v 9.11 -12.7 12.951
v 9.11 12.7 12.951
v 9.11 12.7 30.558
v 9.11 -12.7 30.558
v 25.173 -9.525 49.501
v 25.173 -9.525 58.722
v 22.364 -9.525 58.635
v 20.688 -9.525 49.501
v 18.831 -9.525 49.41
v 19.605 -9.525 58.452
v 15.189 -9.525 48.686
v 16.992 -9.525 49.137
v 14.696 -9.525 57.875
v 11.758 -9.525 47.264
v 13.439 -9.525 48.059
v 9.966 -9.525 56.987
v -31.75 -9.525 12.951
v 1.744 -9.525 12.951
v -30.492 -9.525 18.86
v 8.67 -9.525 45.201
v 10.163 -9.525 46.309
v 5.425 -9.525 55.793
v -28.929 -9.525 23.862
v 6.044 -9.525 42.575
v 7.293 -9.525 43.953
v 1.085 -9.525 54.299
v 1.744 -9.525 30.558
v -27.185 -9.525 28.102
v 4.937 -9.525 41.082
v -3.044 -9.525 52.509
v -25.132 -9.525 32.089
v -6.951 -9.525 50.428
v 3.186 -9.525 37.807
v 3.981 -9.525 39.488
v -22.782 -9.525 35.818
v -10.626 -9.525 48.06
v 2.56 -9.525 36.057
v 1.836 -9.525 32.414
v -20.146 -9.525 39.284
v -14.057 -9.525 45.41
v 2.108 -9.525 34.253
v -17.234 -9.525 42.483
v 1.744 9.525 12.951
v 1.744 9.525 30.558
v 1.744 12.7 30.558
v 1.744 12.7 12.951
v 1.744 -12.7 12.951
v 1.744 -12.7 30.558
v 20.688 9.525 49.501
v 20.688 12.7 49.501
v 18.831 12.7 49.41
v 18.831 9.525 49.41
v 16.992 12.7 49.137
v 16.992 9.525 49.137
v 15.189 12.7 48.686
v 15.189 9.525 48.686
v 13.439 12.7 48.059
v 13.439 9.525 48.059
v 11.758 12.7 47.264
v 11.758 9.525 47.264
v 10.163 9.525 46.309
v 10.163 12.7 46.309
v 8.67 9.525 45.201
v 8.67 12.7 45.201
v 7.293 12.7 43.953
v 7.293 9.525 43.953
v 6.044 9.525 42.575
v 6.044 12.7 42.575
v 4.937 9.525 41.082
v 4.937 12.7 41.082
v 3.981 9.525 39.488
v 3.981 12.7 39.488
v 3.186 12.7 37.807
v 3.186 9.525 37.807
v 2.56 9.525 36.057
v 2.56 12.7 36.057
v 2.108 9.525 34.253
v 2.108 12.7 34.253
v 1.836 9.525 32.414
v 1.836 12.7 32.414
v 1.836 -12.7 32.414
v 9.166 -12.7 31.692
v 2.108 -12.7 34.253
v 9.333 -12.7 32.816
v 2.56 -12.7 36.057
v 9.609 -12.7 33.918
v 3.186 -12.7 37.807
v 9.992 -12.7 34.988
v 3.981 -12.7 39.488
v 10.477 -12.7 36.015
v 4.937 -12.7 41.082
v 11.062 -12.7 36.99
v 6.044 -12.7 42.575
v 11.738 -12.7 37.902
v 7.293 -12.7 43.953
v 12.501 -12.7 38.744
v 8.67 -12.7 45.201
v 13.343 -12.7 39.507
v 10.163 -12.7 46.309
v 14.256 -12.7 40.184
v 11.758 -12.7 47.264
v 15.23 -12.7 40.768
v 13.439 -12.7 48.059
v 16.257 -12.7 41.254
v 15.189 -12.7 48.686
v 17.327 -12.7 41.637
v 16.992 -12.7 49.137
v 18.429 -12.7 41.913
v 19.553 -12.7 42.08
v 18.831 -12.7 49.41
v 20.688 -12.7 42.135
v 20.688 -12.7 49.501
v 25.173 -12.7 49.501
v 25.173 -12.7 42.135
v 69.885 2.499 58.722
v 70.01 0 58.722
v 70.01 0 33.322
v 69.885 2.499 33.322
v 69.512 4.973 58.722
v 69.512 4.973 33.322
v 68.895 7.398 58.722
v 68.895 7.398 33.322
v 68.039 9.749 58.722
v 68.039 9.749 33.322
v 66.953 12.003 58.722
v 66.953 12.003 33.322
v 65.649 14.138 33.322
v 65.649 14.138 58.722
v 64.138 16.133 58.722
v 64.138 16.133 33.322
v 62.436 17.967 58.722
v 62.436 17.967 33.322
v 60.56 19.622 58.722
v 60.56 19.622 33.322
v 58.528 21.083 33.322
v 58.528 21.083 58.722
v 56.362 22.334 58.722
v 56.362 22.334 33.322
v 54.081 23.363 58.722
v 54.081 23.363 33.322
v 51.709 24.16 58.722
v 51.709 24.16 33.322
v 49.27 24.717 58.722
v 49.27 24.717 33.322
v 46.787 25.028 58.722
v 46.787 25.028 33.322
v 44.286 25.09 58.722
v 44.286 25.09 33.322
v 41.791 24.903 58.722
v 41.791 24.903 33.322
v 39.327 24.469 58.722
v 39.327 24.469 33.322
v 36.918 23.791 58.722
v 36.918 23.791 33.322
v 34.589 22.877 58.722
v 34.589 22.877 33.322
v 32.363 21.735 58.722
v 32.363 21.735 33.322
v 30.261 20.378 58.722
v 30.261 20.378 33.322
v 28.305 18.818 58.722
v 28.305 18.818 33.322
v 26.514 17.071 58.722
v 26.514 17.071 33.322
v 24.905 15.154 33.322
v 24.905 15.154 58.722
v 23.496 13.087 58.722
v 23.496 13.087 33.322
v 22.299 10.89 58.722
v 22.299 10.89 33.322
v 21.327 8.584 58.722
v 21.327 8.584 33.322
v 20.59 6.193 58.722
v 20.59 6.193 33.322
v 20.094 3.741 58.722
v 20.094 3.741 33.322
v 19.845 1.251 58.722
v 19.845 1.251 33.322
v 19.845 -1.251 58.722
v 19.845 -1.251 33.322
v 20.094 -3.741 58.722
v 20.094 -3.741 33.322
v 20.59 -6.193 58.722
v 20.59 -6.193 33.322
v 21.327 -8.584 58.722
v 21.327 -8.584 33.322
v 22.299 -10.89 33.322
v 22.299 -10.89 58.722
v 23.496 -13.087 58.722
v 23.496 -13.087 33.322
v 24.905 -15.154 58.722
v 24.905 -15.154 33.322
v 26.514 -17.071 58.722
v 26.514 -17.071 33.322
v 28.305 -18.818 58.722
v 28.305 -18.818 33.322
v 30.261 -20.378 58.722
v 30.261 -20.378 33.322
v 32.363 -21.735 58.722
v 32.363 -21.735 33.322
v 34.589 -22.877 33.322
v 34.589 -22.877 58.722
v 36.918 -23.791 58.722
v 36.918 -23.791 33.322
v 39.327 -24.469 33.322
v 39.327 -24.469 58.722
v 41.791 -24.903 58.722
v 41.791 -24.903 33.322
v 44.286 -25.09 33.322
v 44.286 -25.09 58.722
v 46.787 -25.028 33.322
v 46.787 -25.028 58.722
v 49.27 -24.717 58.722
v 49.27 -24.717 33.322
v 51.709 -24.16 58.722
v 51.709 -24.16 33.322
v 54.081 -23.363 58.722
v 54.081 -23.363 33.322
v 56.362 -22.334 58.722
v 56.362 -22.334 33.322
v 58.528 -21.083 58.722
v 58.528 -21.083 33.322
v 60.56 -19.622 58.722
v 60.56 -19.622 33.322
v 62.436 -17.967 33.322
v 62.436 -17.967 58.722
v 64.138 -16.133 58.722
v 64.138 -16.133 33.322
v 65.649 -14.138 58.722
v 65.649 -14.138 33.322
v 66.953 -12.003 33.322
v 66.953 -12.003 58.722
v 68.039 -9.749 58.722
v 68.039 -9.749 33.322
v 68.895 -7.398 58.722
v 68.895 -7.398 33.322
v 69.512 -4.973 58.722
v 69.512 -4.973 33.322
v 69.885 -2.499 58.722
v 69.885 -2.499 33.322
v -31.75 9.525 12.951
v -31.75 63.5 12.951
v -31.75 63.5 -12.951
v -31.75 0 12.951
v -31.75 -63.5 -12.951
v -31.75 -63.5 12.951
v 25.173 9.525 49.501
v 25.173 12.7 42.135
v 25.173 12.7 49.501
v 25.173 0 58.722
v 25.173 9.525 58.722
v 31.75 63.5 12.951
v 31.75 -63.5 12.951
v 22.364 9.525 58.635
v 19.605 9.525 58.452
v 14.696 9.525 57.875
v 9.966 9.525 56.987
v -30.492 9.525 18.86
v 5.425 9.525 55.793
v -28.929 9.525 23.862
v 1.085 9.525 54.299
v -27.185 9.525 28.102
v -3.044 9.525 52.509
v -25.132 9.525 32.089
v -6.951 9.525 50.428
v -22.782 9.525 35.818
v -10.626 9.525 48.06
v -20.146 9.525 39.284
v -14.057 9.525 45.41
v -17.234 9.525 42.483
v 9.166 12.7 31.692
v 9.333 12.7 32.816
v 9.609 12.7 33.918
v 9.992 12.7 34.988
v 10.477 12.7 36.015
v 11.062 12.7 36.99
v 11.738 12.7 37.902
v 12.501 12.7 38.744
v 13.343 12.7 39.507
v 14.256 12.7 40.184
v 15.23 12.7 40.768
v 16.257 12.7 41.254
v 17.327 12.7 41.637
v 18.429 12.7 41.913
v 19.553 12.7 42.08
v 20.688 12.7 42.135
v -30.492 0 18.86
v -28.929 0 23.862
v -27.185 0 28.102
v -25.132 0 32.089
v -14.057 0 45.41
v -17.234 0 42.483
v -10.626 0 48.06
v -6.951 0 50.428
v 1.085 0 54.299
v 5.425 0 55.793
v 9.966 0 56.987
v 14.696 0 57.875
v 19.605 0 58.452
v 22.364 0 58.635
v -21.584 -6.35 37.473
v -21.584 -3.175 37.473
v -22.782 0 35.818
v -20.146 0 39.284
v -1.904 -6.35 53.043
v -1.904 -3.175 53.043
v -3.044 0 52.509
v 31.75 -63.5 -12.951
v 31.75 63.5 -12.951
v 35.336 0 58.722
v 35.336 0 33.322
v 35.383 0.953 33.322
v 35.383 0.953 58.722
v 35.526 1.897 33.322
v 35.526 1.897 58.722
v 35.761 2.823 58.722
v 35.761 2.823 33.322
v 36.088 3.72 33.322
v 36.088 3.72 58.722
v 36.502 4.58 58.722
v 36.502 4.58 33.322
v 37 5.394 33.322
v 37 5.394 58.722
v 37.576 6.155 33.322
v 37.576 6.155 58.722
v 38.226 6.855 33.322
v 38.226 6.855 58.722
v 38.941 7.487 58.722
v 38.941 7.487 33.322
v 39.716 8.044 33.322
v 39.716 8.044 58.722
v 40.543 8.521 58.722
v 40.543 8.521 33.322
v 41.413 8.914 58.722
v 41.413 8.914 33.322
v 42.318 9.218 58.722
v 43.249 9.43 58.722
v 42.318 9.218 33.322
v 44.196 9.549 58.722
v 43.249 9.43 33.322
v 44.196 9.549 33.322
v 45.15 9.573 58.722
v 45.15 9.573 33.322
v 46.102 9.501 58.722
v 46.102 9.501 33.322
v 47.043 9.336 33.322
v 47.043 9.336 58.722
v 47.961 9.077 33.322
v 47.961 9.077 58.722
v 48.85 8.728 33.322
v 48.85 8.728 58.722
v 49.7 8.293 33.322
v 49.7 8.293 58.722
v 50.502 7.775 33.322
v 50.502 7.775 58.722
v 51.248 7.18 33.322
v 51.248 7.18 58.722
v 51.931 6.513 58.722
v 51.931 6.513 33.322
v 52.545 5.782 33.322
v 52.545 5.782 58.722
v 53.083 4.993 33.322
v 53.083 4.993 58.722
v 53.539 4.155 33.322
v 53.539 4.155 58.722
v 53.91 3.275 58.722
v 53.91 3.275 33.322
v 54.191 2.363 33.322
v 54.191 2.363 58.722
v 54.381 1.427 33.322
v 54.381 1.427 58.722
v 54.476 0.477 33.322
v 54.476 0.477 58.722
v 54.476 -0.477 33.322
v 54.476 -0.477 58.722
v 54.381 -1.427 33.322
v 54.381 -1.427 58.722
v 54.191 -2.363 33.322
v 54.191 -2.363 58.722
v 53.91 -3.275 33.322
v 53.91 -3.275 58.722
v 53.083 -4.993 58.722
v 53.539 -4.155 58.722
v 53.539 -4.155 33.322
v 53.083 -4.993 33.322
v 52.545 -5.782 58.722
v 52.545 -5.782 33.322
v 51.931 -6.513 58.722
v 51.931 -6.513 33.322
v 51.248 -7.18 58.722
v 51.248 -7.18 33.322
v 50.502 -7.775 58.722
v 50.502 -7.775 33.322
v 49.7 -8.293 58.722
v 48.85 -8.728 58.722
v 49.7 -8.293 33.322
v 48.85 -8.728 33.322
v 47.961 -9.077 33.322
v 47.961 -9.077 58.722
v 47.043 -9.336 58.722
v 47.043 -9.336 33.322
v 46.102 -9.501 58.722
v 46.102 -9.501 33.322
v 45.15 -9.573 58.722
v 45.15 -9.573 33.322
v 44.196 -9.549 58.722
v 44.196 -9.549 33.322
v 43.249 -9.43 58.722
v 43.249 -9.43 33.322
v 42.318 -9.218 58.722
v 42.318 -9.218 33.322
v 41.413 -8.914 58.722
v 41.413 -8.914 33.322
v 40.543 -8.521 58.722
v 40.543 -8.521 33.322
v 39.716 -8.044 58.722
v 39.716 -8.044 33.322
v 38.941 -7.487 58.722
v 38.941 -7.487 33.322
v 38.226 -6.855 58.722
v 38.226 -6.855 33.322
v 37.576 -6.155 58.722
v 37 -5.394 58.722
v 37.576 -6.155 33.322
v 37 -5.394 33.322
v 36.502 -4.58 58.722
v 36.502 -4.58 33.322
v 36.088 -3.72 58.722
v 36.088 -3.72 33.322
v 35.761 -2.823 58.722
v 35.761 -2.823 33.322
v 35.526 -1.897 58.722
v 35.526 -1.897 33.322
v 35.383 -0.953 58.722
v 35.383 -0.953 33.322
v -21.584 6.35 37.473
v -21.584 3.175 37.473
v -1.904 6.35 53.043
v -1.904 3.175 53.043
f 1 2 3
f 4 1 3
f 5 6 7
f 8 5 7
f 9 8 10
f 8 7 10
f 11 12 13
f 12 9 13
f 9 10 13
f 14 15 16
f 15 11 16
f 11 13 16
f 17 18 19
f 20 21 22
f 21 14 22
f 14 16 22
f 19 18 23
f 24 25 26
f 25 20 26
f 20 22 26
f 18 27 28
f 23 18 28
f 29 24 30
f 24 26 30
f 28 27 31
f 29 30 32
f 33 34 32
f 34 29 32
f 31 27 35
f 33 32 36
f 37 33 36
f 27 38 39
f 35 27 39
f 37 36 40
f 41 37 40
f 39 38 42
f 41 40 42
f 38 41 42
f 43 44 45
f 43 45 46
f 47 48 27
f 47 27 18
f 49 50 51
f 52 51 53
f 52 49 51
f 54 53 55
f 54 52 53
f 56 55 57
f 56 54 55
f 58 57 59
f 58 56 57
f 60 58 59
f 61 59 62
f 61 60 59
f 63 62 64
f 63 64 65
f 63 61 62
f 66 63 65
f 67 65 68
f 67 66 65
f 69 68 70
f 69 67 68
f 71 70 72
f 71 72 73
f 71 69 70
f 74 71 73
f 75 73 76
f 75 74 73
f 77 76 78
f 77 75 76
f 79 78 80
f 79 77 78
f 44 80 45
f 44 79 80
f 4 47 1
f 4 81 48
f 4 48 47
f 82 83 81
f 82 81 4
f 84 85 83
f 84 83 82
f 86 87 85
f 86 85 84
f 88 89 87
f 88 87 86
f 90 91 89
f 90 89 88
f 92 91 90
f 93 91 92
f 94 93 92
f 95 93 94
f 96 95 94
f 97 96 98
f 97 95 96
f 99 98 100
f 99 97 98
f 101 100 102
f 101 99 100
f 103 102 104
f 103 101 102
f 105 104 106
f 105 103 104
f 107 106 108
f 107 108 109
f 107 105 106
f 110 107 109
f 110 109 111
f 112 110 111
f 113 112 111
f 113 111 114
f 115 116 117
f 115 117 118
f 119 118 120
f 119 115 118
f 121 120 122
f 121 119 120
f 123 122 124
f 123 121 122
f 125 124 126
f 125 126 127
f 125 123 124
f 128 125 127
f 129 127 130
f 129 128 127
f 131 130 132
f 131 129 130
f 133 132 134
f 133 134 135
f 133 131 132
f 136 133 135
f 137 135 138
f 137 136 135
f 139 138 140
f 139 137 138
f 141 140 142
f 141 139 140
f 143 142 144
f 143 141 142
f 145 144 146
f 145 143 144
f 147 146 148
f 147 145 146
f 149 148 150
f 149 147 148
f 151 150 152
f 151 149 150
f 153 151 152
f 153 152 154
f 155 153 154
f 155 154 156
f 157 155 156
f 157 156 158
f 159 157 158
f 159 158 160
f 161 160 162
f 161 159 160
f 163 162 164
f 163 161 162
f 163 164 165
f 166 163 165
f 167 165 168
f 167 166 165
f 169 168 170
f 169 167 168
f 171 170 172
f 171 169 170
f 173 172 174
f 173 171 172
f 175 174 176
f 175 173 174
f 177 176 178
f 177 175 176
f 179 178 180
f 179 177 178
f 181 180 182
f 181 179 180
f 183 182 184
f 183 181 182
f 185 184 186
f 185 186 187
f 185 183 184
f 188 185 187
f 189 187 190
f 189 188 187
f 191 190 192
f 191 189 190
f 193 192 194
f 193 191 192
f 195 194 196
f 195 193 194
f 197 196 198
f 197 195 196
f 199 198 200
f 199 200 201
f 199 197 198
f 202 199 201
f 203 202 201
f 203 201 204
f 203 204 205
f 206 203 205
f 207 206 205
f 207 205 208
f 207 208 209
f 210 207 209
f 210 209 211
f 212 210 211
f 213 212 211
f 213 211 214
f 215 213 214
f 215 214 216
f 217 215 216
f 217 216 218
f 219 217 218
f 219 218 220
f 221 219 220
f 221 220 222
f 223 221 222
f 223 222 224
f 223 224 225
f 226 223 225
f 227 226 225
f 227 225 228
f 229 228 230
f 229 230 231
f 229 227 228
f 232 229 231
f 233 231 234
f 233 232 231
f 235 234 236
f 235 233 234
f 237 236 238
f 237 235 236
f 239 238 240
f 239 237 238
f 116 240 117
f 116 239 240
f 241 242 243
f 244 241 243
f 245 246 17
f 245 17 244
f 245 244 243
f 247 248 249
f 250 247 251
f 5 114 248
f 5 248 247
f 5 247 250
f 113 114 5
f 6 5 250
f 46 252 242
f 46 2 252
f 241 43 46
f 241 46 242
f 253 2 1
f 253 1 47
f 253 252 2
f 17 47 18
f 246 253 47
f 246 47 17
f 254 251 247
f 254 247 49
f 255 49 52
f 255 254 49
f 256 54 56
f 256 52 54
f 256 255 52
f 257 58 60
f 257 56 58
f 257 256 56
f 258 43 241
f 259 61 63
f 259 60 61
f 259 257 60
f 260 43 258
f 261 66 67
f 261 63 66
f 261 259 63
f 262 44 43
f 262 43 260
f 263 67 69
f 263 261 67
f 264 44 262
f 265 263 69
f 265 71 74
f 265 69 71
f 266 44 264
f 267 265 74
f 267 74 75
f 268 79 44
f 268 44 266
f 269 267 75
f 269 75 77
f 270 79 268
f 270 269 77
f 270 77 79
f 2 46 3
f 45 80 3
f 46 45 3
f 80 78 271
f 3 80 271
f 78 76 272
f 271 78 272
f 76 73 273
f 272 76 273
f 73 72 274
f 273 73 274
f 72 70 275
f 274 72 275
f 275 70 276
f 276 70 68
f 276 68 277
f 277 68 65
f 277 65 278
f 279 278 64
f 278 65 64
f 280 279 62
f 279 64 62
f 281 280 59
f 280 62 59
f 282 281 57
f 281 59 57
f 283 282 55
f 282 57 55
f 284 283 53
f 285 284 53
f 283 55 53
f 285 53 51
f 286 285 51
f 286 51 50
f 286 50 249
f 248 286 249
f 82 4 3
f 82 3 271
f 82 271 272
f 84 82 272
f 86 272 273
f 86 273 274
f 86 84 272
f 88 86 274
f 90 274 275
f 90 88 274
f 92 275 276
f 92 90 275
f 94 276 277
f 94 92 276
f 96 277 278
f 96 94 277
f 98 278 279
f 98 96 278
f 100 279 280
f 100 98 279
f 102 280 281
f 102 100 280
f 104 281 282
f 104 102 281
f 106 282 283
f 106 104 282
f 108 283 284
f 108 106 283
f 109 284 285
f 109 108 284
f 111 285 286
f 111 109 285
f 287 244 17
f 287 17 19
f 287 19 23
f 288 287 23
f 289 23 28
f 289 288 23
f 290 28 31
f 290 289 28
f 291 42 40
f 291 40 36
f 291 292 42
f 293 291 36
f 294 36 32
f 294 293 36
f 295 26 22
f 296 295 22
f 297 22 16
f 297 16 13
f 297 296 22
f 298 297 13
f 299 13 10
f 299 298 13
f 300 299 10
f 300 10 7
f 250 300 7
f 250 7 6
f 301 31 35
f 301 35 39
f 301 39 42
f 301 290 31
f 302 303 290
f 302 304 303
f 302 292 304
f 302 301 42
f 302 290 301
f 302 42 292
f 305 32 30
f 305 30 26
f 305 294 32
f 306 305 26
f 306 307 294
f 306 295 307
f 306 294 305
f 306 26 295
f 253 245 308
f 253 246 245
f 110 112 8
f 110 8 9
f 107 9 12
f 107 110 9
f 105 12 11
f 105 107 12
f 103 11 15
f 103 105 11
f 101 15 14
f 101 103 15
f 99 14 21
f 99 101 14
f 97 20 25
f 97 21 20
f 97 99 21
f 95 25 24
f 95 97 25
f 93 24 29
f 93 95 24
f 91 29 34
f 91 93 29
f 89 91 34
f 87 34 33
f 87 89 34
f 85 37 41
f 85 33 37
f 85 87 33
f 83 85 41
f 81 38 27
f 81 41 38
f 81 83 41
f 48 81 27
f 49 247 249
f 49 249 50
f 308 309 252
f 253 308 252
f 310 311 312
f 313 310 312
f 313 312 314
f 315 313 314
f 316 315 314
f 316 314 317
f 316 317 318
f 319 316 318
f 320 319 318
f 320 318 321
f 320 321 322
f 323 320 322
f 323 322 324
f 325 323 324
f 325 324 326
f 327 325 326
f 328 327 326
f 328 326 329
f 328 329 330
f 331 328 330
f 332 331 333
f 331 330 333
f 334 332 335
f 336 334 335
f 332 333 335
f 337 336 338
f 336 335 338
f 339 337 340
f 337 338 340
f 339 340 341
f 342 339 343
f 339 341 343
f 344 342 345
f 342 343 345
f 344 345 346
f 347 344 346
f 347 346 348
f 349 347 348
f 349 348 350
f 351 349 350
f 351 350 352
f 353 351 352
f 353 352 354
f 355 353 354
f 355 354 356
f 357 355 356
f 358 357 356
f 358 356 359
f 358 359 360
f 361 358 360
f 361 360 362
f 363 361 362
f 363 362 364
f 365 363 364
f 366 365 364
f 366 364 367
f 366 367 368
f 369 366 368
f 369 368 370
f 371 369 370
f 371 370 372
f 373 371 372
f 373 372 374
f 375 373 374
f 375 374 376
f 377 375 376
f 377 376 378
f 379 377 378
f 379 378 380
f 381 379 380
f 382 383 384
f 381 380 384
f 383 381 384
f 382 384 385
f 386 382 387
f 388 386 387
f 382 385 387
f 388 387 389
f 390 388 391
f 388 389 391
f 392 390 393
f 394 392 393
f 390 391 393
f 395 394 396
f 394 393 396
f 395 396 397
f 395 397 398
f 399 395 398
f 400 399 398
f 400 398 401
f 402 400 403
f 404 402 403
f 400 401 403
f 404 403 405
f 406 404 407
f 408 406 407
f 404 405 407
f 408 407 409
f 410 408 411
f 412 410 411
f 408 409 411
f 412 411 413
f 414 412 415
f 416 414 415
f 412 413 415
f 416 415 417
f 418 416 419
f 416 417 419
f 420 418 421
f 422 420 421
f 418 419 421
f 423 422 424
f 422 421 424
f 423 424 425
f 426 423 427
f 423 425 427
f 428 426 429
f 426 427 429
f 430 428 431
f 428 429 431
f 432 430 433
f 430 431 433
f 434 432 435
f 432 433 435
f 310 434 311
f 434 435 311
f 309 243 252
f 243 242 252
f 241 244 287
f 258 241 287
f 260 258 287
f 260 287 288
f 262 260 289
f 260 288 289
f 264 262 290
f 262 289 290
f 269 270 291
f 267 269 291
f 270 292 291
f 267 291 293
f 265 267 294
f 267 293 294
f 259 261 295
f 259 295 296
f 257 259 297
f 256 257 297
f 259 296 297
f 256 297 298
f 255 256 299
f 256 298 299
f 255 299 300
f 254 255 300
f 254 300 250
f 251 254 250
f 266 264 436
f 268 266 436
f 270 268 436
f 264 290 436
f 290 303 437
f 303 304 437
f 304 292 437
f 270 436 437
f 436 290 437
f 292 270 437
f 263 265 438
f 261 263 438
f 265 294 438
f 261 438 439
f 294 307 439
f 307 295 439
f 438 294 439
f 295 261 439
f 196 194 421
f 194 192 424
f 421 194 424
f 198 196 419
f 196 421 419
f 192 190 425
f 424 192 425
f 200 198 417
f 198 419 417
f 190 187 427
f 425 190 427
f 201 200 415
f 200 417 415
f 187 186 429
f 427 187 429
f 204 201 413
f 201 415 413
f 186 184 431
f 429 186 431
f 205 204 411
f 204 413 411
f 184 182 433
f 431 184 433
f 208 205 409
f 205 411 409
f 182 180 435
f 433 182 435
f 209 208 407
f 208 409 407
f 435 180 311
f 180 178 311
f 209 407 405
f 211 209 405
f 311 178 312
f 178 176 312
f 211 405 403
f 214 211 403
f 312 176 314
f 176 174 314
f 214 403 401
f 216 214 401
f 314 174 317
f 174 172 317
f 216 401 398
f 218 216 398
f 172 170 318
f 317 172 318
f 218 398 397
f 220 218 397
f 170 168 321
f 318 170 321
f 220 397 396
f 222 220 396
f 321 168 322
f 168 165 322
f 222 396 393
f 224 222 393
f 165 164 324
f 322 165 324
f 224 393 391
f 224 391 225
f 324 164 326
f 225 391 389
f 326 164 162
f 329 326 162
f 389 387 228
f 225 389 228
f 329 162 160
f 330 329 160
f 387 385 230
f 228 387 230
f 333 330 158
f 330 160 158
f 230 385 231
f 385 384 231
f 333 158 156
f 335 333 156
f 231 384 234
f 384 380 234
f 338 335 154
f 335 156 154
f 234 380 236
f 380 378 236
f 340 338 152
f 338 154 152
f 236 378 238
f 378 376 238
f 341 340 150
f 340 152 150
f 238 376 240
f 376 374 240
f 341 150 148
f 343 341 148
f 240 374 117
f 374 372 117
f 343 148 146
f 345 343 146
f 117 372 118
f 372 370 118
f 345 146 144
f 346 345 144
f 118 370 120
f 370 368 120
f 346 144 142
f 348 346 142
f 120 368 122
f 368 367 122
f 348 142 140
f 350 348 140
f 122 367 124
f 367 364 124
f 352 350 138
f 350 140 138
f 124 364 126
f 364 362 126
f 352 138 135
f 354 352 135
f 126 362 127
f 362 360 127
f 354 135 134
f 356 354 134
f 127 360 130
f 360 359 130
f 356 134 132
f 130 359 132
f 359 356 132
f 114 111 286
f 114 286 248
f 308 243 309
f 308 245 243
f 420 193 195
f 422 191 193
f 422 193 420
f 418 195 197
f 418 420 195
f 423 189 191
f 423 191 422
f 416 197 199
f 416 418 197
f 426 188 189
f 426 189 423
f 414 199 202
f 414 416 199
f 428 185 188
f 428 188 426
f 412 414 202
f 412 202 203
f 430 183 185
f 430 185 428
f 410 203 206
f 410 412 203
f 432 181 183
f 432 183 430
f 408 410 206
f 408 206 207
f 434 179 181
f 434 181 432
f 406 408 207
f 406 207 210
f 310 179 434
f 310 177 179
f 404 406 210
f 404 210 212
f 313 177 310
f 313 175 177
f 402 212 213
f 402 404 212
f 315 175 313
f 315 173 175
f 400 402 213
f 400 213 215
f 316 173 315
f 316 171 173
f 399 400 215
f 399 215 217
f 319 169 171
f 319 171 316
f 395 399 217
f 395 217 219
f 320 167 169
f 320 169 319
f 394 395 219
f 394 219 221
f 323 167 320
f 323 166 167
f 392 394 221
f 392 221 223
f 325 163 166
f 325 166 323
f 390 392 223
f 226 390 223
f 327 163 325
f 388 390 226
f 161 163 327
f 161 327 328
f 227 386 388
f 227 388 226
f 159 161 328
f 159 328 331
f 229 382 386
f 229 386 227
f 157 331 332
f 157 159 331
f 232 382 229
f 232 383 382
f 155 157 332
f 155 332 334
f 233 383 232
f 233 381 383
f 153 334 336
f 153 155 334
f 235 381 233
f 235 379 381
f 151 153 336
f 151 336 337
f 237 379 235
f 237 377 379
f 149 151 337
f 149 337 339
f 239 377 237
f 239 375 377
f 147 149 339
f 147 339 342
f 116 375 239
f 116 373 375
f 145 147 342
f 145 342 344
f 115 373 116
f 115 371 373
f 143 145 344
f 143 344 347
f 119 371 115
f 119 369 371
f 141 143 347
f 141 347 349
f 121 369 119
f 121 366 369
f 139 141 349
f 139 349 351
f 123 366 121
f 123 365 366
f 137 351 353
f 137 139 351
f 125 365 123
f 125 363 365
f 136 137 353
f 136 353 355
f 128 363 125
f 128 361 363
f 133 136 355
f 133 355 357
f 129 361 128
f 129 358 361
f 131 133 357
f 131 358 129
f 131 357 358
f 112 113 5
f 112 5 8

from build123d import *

# Parameters (mm, degrees)
F1_DEPTH = 63.5
F2_DEPTH = 9.525
F3_DEPTH = 12.7
F5_R     = 25.0978379379
F6_DEPTH = 25.4
F8_D     = 19.1516


with BuildPart() as f1:
    # F0 (on Front) → F1 (new body, symmetric)
    with BuildSketch(Plane.XZ):
        Polygon((-31.75, -12.9509741405), (31.75, -12.9509741405), (31.75, 12.9509741405), (9.1103371233, 12.9509741405), (1.7443363501, 12.9509741405), (-31.75, 12.9509741405), align=None)
    extrude(amount=F1_DEPTH, both=True)

    # F0 (on Front) → F2 (join, symmetric)
    with BuildSketch(Plane.XZ):
        with BuildLine():
            add(Edge.make_bspline(
                [(-31.75, 12.9509741405), (-27.0471625327, 41.6362041566), (-4.8953407756, 58.3005508379), (25.1726394472, 58.7224372514)],
                knots=[0, 0, 0, 0, 73.042547306, 73.042547306, 73.042547306, 73.042547306], degree=3))
            Line((-31.75, 12.9509741405), (1.7443363501, 12.9509741405))
            Line((1.7443363501, 12.9509741405), (1.7443363501, 30.5575896055))
            ThreePointArc((1.7443363501, 30.5575896055), (7.2928233486, 43.9528221678), (20.688055911, 49.5013091663))
            Line((20.688055911, 49.5013091663), (25.1726394472, 49.5013091663))
            Line((25.1726394472, 49.5013091663), (25.1726394472, 58.7224372514))
        make_face()
    extrude(amount=F2_DEPTH, both=True)

    # F0 (on Front) → F3 (join, symmetric)
    with BuildSketch(Plane.XZ):
        with BuildLine():
            Line((1.7443363501, 12.9509741405), (9.1103371233, 12.9509741405))
            Line((9.1103371233, 12.9509741405), (9.1103371233, 30.5575896055))
            ThreePointArc((9.1103371233, 30.5575896055), (12.5013724455, 38.7442730709), (20.688055911, 42.1353083932))
            Line((20.688055911, 42.1353083932), (25.1726394472, 42.1353083932))
            Line((25.1726394472, 42.1353083932), (25.1726394472, 49.5013091663))
            Line((25.1726394472, 49.5013091663), (20.688055911, 49.5013091663))
            ThreePointArc((20.688055911, 49.5013091663), (7.2928233486, 43.9528221678), (1.7443363501, 30.5575896055))
            Line((1.7443363501, 30.5575896055), (1.7443363501, 12.9509741405))
        make_face()
    extrude(amount=F3_DEPTH, both=True)


with BuildPart() as f4:
    # F0 (on Front) → F4 (revolve)
    with BuildSketch(Plane.XZ):
        Polygon((64.6507700858, 58.7224372514), (44.9117047665, 58.7224372514), (44.9117047665, 49.5013091663), (44.9117047665, 42.1353083932), (44.9117047665, 35.1127609611), (64.6507700858, 35.1127609611), align=None)
    revolve(axis=Axis((44.9117047665, 0, 46.9175991062), (0, 0, -1)))

    # F5 (on face) → F6 (join)
    with BuildSketch(Plane.XY.offset(58.7224372514)):
        with Locations((44.9117047665, 0)):
            Circle(F5_R)
    extrude(amount=-F6_DEPTH)

    # F8 (through all)
    with Locations(Plane.XY.offset(58.7224372514)):
        with Locations((44.9117047665, 0)):
            Hole(F8_D / 2)


solid = Compound([f1.part, f4.part])
